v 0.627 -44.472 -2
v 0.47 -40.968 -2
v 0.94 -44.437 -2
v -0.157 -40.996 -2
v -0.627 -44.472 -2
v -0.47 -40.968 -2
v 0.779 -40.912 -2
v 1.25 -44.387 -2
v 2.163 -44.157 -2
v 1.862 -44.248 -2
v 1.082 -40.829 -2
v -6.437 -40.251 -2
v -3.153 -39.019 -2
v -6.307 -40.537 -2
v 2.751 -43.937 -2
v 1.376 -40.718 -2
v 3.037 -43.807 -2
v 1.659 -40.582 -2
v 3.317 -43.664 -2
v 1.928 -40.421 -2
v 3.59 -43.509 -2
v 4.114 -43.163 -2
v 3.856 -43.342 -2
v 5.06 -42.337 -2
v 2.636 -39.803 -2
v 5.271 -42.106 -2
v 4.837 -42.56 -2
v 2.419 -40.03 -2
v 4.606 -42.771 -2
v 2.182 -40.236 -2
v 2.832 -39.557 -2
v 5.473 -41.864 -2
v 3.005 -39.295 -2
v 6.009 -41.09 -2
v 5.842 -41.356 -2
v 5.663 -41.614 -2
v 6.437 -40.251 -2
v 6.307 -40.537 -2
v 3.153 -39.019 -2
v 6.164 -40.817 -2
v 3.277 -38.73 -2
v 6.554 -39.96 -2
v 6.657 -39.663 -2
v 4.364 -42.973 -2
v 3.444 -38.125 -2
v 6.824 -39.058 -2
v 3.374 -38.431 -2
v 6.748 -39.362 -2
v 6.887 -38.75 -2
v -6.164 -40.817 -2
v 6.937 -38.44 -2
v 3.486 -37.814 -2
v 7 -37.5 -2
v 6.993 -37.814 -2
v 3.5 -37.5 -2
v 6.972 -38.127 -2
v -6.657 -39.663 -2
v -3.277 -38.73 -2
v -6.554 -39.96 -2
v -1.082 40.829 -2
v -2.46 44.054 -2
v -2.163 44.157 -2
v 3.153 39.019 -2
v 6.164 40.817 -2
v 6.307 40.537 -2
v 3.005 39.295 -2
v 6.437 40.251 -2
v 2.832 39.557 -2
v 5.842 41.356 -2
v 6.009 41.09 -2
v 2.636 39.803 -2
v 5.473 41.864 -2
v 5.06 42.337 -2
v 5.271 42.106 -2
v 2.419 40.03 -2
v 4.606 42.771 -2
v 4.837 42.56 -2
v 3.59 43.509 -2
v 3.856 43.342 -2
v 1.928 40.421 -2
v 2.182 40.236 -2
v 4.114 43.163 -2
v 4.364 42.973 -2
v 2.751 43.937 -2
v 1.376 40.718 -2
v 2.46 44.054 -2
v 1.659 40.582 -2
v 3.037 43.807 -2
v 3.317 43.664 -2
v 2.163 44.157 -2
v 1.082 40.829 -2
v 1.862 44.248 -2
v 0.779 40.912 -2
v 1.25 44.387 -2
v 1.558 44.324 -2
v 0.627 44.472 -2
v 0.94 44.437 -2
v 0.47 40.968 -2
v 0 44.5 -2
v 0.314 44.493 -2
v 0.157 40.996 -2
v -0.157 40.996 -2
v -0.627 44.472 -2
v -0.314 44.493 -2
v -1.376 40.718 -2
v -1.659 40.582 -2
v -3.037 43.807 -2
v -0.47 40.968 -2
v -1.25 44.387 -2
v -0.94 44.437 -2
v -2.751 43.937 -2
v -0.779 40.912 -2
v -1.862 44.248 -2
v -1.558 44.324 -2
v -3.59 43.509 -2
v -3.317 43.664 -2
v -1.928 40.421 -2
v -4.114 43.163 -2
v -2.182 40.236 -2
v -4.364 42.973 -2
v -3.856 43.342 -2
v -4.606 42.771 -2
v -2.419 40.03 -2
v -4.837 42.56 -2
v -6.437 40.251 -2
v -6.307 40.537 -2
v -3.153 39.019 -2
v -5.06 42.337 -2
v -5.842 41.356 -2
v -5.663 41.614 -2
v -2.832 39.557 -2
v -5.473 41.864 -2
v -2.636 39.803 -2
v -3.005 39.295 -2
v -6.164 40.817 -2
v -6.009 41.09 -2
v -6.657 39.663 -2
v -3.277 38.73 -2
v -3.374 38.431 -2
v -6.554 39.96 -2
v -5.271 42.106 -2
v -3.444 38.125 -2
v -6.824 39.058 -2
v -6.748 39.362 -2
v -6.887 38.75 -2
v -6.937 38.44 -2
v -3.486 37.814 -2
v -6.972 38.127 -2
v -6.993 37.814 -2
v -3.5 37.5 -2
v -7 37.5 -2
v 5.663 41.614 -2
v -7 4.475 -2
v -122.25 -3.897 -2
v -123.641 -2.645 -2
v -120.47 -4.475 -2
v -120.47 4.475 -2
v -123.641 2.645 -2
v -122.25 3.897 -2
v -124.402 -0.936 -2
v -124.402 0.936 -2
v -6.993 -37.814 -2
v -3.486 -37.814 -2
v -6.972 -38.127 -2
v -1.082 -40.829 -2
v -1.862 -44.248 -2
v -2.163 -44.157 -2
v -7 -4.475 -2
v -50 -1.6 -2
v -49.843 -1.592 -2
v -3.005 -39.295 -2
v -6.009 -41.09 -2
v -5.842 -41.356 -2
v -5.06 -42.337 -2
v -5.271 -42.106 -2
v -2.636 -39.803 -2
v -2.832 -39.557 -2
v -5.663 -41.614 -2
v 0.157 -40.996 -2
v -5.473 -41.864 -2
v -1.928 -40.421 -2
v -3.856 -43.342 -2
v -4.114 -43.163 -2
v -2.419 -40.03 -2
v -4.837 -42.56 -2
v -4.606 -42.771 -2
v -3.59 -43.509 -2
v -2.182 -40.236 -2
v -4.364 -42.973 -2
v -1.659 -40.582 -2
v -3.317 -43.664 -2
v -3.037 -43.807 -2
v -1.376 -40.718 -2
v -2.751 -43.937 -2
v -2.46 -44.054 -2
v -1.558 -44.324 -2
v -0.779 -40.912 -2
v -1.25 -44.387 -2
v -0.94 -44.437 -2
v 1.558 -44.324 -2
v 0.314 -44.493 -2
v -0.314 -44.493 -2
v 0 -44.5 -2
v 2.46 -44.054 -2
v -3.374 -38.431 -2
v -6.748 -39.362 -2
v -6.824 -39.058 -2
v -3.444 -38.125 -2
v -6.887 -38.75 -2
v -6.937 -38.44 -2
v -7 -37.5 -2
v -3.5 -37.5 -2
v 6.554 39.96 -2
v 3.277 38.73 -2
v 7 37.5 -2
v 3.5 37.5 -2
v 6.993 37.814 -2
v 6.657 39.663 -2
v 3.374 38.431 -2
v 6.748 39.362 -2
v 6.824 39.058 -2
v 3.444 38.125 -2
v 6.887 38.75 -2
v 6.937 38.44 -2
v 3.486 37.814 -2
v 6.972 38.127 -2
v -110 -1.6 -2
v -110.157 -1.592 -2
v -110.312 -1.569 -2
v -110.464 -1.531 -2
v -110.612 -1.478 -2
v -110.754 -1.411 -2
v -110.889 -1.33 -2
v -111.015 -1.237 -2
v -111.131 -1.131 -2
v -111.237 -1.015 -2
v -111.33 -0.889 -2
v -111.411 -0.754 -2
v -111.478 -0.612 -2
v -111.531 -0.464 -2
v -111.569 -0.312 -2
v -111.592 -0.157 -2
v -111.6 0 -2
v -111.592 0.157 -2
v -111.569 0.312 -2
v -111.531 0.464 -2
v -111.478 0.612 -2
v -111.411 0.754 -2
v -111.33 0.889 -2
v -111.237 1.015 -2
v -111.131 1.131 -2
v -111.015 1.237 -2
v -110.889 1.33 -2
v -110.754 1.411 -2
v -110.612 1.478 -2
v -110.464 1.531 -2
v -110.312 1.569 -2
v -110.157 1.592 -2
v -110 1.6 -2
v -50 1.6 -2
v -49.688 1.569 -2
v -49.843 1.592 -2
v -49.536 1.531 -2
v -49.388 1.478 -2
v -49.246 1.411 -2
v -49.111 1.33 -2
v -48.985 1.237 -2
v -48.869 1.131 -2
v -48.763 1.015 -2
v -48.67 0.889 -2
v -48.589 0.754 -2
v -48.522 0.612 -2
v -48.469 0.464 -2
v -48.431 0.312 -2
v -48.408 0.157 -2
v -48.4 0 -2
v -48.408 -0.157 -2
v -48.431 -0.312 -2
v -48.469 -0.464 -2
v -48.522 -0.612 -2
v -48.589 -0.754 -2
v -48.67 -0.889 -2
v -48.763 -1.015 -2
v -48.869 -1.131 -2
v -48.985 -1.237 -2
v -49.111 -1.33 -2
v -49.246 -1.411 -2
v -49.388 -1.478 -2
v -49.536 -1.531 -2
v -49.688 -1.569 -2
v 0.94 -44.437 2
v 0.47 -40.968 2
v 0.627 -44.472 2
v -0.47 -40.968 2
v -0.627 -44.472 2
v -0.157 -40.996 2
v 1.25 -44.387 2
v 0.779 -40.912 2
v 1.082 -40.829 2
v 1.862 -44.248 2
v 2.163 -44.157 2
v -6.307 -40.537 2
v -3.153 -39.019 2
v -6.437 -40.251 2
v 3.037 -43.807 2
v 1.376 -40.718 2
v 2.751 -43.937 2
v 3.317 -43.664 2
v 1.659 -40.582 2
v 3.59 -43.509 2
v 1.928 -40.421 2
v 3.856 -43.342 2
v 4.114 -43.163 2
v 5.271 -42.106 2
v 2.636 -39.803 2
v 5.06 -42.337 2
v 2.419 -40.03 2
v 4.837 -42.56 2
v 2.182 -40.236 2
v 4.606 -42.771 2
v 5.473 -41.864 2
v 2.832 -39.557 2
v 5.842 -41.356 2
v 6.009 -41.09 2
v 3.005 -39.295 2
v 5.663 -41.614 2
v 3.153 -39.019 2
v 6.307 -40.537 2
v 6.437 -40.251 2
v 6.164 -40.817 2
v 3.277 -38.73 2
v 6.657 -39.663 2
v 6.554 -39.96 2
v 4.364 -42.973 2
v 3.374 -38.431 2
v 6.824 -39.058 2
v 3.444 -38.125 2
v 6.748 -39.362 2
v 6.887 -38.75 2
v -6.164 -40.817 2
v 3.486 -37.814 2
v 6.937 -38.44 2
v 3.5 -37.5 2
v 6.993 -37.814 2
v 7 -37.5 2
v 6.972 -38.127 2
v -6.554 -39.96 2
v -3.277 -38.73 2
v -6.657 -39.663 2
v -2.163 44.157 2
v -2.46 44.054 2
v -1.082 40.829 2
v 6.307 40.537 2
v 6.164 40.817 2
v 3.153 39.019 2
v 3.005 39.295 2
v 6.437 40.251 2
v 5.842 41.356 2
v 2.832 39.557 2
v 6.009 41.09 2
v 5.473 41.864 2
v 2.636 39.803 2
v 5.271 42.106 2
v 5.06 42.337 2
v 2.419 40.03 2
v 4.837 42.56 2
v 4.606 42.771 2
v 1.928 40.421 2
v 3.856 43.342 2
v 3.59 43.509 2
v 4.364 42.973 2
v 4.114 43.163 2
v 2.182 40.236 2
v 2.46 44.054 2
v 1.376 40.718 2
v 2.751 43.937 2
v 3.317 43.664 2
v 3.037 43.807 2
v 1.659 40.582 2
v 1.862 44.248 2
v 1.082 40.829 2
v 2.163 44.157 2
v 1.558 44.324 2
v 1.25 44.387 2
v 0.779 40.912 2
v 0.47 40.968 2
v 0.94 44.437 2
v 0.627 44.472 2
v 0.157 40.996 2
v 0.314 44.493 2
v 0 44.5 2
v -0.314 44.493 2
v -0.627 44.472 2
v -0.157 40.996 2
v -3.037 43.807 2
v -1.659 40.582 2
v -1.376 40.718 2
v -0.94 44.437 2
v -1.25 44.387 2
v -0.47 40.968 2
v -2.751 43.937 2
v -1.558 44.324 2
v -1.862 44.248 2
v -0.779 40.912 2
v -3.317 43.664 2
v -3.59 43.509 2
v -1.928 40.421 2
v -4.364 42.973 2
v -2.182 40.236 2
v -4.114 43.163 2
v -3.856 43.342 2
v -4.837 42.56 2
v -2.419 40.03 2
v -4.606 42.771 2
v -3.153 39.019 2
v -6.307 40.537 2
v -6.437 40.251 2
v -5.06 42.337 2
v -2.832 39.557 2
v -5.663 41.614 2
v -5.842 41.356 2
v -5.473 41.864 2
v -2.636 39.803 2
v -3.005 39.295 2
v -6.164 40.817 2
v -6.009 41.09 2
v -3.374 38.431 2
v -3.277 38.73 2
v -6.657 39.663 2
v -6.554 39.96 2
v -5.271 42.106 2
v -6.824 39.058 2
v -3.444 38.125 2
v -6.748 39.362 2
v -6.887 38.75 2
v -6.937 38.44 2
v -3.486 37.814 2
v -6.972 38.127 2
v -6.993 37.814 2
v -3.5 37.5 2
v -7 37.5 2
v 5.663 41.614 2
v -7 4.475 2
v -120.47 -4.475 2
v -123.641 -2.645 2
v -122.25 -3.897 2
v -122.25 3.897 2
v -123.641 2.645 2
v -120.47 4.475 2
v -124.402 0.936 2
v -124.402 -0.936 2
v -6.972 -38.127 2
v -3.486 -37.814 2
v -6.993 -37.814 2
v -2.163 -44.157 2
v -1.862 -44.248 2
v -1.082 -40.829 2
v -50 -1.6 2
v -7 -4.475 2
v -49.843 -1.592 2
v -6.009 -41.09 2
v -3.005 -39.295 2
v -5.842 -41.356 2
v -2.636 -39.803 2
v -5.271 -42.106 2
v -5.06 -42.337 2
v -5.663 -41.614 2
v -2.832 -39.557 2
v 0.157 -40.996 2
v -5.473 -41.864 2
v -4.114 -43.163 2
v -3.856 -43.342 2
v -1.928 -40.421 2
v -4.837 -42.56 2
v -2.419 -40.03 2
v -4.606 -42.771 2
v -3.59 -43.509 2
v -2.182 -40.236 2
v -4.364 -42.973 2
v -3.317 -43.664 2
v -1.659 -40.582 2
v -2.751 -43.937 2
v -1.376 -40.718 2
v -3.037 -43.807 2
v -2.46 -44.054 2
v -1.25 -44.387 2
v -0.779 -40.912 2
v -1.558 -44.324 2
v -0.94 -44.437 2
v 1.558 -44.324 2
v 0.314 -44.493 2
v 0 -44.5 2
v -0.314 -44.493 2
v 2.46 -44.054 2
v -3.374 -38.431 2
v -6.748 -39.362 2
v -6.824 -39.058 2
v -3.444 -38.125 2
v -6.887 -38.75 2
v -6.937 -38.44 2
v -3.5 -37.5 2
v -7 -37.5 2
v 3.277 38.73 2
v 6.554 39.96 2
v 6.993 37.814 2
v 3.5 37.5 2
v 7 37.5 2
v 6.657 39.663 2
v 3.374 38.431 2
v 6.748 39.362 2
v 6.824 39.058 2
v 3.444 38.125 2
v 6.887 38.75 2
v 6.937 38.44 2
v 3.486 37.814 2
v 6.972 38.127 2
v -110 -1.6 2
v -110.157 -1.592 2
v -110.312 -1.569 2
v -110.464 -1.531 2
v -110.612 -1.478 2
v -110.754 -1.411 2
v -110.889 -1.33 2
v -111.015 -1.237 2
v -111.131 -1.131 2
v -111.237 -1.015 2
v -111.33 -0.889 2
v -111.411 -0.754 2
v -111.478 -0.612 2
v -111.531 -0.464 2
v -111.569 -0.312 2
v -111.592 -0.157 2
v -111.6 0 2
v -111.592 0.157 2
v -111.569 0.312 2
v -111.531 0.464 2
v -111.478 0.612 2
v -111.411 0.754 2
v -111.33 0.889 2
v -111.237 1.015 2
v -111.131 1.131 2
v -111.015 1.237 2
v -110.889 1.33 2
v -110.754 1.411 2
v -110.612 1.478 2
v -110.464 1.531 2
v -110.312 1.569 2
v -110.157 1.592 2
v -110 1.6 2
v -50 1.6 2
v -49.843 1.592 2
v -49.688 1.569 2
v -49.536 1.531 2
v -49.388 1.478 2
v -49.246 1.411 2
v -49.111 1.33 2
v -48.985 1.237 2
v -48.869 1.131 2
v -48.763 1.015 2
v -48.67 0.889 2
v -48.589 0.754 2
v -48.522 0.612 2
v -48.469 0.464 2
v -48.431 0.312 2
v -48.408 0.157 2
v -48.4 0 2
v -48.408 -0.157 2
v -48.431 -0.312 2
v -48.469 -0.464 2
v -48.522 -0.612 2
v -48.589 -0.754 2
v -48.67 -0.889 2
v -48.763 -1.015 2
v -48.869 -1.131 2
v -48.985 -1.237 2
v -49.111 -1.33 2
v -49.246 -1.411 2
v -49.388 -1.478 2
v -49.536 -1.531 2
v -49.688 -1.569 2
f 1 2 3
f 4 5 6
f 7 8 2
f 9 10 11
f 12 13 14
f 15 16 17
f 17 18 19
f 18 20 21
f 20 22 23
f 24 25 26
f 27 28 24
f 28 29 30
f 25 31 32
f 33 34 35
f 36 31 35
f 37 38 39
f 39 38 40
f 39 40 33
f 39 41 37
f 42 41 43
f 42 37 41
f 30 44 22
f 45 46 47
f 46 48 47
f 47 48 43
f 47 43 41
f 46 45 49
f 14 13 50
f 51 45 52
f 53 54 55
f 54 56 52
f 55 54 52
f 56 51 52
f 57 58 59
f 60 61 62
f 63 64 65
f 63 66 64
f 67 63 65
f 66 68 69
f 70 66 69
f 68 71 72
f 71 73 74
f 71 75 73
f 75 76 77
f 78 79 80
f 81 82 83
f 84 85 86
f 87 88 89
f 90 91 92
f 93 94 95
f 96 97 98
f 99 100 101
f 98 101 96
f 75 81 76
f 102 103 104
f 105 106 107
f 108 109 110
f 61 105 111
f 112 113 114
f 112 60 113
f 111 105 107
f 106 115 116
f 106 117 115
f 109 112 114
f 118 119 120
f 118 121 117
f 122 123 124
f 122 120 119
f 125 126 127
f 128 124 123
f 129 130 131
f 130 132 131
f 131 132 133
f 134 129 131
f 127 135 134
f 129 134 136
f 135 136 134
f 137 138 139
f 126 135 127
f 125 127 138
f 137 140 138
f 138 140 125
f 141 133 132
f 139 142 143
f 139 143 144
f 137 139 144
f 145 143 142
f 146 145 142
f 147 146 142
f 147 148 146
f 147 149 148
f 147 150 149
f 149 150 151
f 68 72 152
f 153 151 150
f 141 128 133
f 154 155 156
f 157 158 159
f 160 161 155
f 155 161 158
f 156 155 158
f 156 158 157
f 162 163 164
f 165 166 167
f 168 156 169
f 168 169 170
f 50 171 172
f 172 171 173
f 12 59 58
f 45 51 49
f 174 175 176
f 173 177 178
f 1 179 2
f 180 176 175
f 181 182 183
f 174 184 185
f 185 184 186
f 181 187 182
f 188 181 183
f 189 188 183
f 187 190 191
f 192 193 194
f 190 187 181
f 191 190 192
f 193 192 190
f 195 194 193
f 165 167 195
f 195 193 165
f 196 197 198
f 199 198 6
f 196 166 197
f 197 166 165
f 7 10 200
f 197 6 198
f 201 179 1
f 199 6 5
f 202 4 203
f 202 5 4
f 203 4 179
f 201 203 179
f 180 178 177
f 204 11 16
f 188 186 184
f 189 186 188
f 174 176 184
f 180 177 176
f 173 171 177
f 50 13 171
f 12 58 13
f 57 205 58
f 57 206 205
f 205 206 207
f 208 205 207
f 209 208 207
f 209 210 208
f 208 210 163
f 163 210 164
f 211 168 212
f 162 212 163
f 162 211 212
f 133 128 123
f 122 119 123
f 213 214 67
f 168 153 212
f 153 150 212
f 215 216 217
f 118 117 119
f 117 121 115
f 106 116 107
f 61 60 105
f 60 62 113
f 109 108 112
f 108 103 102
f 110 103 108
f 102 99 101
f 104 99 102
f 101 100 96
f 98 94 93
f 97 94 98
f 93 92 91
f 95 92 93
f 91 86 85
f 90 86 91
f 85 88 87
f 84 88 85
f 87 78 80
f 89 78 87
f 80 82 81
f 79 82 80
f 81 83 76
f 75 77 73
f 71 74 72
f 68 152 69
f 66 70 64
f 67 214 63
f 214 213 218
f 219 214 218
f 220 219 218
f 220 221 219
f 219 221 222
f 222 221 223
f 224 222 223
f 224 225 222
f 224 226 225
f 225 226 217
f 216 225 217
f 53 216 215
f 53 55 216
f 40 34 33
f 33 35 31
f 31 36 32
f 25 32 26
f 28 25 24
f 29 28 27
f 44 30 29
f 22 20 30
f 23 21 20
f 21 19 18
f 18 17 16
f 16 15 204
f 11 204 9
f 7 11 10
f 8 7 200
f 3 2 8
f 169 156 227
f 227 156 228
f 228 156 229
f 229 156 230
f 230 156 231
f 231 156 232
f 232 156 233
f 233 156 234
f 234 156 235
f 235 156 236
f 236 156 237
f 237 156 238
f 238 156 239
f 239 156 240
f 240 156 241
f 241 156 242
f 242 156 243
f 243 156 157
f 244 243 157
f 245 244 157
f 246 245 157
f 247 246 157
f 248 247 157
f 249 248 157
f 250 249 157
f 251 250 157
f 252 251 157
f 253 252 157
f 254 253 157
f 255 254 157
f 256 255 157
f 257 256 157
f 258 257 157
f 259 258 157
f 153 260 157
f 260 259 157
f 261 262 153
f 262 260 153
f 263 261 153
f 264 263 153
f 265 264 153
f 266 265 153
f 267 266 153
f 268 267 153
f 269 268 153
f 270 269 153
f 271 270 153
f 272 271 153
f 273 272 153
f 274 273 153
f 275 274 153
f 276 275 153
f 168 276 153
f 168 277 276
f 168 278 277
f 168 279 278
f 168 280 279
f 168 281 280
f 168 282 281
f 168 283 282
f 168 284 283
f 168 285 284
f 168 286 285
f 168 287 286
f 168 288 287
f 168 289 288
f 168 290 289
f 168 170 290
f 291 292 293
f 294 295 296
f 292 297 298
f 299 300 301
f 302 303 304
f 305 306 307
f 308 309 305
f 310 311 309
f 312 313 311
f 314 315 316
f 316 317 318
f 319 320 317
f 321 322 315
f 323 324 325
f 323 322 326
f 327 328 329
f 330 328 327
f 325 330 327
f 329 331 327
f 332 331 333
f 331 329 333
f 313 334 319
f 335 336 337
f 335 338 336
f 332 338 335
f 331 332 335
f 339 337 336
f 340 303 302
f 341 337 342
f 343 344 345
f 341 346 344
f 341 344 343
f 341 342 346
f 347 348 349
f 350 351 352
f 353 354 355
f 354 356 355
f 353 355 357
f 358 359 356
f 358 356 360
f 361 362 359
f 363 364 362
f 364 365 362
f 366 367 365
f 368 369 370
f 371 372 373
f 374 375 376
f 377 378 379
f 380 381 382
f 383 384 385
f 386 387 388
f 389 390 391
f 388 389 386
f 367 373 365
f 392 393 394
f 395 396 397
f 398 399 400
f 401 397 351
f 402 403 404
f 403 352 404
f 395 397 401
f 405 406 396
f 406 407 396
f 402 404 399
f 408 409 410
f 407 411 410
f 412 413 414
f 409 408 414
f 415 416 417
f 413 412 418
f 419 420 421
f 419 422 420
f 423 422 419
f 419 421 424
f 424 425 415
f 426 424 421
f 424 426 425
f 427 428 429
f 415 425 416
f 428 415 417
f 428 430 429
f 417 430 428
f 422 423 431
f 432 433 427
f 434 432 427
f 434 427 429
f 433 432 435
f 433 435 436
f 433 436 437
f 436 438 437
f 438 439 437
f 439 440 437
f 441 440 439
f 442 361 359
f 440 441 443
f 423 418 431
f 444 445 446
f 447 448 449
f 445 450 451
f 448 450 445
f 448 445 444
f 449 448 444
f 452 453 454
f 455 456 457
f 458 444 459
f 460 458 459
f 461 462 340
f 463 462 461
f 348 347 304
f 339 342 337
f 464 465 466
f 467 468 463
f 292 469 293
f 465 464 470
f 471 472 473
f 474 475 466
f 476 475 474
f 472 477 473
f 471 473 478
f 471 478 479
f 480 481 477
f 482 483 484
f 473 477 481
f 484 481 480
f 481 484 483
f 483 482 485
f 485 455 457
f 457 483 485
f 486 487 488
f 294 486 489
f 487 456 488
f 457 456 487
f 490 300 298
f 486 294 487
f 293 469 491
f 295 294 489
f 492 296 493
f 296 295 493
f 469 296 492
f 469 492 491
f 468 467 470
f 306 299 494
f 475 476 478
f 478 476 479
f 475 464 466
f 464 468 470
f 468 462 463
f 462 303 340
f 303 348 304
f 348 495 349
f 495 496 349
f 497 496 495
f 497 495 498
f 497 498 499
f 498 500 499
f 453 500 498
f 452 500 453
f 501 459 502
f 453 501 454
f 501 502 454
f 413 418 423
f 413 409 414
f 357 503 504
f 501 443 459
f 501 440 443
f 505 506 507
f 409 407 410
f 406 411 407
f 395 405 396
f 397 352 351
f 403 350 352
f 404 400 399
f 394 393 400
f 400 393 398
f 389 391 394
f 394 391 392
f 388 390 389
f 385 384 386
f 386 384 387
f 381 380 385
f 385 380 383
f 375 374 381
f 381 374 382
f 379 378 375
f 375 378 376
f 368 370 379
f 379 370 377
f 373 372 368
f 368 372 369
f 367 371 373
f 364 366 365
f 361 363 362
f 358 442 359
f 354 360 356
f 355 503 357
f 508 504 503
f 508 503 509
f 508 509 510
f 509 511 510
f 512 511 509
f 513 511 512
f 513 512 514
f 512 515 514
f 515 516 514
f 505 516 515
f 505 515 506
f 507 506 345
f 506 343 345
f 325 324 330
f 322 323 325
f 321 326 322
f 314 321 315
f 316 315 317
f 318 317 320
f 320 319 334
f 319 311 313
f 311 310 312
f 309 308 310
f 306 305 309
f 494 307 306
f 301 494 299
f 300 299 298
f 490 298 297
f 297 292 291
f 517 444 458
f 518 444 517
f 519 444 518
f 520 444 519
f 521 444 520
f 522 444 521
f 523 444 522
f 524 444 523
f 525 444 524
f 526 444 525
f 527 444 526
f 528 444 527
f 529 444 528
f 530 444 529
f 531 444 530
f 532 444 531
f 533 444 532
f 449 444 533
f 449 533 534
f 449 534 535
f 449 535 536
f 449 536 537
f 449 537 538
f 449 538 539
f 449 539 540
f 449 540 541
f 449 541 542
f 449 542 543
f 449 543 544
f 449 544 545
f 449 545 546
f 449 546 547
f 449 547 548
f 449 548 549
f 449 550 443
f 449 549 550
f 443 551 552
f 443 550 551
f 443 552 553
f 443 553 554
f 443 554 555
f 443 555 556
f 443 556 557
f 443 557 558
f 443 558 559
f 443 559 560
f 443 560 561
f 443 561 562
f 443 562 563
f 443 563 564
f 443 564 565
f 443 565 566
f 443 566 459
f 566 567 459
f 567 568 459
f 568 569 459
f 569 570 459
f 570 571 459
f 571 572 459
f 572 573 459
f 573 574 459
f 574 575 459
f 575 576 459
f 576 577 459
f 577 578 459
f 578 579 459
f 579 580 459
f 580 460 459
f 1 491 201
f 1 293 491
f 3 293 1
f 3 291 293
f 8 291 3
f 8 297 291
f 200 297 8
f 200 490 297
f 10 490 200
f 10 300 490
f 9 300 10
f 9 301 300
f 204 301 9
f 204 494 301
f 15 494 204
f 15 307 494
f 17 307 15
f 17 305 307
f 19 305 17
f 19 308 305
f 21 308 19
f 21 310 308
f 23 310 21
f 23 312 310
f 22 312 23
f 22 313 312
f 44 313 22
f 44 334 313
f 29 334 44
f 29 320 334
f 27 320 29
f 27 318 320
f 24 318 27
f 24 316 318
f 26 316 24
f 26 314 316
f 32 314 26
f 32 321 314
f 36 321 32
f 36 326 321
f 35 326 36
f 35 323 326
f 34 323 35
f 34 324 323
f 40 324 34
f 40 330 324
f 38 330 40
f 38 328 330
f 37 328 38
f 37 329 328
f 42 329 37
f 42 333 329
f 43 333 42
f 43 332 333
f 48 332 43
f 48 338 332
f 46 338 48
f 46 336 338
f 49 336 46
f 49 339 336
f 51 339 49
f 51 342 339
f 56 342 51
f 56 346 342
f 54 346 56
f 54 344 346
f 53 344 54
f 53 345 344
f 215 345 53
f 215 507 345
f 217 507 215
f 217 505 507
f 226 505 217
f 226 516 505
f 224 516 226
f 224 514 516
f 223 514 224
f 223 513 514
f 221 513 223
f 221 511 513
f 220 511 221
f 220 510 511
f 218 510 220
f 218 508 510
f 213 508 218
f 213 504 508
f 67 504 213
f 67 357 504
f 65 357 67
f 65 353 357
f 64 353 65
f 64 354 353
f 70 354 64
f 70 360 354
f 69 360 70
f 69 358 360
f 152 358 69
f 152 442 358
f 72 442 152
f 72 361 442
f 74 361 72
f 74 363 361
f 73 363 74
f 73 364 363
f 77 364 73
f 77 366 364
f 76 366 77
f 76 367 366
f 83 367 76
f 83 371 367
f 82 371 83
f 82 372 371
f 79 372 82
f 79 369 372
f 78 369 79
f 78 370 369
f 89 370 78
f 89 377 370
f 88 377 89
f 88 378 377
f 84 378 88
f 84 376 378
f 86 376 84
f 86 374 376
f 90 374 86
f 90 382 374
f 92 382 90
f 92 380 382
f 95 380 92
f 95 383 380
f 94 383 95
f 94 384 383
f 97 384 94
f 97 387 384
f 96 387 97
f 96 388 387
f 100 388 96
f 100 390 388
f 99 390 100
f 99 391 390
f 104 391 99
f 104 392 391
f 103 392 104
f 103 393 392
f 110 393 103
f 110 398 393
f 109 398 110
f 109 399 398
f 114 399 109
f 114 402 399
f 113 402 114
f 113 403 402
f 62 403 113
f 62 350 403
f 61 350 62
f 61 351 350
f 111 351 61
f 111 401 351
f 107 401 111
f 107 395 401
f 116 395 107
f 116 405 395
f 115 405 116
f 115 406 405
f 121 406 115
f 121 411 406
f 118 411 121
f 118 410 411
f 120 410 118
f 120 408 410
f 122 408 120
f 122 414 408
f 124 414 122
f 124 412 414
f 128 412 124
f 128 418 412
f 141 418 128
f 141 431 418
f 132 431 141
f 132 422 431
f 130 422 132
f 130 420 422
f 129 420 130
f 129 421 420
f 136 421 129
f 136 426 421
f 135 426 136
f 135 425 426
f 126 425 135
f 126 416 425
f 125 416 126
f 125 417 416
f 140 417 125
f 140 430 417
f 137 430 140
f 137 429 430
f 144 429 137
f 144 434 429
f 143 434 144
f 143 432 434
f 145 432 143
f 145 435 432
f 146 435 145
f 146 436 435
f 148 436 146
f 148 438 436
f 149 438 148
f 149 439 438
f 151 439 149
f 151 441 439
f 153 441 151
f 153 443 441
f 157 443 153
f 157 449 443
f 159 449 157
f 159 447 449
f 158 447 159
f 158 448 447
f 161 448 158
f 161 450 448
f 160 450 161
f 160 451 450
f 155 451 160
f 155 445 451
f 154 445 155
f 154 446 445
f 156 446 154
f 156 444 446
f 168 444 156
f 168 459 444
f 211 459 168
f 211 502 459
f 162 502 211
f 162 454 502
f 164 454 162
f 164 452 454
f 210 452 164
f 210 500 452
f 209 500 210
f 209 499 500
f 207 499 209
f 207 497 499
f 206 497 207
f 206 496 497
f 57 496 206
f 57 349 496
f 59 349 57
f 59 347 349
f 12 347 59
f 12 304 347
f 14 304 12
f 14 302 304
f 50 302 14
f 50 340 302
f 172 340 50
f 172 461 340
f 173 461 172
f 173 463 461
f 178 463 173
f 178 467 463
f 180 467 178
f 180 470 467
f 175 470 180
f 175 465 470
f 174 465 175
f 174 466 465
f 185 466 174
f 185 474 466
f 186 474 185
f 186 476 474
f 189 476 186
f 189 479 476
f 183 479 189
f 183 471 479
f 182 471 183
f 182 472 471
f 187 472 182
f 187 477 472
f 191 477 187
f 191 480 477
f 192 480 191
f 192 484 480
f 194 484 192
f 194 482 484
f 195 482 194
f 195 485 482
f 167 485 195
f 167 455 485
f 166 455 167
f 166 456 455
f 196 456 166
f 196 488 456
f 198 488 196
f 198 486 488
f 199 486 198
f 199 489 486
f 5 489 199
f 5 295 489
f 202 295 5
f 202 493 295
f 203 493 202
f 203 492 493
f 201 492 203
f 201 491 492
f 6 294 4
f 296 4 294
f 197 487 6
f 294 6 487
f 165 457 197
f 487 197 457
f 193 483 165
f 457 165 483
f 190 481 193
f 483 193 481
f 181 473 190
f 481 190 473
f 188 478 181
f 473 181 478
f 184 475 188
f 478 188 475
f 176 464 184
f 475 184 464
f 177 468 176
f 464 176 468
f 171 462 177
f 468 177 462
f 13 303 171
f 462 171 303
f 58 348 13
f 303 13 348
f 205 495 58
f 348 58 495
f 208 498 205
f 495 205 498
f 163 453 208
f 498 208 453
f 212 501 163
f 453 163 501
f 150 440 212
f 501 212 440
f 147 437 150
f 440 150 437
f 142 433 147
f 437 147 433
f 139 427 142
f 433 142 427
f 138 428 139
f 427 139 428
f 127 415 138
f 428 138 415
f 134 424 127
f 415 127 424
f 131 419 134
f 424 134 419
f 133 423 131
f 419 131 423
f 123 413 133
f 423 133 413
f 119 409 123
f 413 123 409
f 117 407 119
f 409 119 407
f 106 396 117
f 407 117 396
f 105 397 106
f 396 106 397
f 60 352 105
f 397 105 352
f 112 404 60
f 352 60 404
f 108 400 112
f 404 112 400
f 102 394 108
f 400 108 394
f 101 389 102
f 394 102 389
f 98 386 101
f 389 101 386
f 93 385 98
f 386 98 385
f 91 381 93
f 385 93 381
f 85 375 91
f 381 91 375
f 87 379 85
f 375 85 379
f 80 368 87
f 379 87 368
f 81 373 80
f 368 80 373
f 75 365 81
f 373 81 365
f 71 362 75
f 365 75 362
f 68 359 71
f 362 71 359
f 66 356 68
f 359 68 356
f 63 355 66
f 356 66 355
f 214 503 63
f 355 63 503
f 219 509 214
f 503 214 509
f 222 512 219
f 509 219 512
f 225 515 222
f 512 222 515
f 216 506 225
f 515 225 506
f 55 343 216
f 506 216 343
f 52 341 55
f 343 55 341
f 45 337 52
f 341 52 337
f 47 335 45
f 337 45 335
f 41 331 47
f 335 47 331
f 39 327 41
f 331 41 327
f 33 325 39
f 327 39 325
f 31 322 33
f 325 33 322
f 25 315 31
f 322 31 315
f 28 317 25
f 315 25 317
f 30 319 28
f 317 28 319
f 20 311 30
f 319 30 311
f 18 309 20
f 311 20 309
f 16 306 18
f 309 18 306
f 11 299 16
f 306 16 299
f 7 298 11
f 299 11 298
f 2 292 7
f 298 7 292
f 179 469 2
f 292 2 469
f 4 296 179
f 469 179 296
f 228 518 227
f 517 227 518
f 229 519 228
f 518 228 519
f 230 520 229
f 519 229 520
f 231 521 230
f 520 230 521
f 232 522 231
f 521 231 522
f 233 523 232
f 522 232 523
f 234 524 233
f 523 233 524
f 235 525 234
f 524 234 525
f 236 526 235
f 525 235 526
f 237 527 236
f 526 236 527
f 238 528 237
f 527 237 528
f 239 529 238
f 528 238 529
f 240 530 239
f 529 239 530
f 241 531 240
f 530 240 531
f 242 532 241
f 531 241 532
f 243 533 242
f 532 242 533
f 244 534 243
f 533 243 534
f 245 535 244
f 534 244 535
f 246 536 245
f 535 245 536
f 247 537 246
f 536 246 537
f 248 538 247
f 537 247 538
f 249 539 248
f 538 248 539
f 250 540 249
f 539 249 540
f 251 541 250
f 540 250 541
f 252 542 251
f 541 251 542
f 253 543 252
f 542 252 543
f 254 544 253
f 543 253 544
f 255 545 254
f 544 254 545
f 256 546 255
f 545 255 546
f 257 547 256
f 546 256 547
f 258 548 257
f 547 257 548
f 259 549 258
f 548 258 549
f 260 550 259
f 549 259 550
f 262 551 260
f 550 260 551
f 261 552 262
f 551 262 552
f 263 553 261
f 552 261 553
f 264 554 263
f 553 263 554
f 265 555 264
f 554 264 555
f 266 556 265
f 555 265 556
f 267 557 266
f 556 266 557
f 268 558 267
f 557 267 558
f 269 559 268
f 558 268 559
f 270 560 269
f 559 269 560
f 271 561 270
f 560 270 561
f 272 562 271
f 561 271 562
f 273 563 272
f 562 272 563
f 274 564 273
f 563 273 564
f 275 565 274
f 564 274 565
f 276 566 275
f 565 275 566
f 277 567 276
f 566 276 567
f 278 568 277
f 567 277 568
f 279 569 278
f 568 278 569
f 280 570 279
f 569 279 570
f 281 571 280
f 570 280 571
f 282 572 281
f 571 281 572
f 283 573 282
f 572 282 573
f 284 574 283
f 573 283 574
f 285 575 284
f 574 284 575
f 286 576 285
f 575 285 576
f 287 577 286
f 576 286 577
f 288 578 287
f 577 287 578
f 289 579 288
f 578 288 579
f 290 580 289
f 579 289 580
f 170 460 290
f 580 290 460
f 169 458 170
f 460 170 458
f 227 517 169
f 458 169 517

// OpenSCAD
/* 定义变量 */
h = 9;		//导轨高度
L = 120;		//滑块与滑槽的距离
H = 75;		//滑槽高度
d = 7;		//滑槽宽度
tick = 3.5;	//滑槽厚度
//螺丝
LSd = 3.2;	//螺丝直径
LSh = 2;	//螺丝长度
LMd = 5.2;	//螺帽直径
LMt = 2.5;	//螺帽厚度
LSxd = 10;	//螺丝位置间隔

/* 模块 */
/* 滑槽 */
//类椭圆函数
module HuaCao_mod(_r) {
	$fn = _r*20;
	_H = H/2;
	hull() {
		translate([0, _H, 0]) {
			circle(r = _r, center = true);
		}
		translate([0, -_H, 0]) {
			circle(r = _r, center = true);
		}
	}
}
/* 杆 */
module Gan() {
	hull()
	{
		translate([-L, 0, 0]) circle(d = h);
		circle(d = h);
	}
}
/* 螺丝 */
module LuoSiT(_x) {
	translate([-_x, 0]) {
		translate([0, (h-LSh)/2]) square(size=[LSd, LSh+LMt], center=true);
		translate([0, (h-LMt)/2 - LSh ]) square(size=[LMd, LMt], center=true);
	}
}
module LuoSiO(_x) {
	$fn = LSd*20;
	translate([-_x, 0]) {
		circle(d = LSd);
	}
}

/* 装配 */
linear_extrude(height=4, center=true, convexity=10, twist=0)
difference()
{
	union()
	{
		HuaCao_mod(d/2 + tick);
		Gan();
	}
	HuaCao_mod(d/2);
	// for (i=[1:2:6]) {
	// 	LuoSiT(L - i*LSxd);
	// }
	// for (i=[0:1:7]) {
	// 	LuoSiO(L - i*LSxd);
	// }
	hull()
	{
		LuoSiO(L-LSxd);
		LuoSiO(L-7*LSxd);
	}
}
